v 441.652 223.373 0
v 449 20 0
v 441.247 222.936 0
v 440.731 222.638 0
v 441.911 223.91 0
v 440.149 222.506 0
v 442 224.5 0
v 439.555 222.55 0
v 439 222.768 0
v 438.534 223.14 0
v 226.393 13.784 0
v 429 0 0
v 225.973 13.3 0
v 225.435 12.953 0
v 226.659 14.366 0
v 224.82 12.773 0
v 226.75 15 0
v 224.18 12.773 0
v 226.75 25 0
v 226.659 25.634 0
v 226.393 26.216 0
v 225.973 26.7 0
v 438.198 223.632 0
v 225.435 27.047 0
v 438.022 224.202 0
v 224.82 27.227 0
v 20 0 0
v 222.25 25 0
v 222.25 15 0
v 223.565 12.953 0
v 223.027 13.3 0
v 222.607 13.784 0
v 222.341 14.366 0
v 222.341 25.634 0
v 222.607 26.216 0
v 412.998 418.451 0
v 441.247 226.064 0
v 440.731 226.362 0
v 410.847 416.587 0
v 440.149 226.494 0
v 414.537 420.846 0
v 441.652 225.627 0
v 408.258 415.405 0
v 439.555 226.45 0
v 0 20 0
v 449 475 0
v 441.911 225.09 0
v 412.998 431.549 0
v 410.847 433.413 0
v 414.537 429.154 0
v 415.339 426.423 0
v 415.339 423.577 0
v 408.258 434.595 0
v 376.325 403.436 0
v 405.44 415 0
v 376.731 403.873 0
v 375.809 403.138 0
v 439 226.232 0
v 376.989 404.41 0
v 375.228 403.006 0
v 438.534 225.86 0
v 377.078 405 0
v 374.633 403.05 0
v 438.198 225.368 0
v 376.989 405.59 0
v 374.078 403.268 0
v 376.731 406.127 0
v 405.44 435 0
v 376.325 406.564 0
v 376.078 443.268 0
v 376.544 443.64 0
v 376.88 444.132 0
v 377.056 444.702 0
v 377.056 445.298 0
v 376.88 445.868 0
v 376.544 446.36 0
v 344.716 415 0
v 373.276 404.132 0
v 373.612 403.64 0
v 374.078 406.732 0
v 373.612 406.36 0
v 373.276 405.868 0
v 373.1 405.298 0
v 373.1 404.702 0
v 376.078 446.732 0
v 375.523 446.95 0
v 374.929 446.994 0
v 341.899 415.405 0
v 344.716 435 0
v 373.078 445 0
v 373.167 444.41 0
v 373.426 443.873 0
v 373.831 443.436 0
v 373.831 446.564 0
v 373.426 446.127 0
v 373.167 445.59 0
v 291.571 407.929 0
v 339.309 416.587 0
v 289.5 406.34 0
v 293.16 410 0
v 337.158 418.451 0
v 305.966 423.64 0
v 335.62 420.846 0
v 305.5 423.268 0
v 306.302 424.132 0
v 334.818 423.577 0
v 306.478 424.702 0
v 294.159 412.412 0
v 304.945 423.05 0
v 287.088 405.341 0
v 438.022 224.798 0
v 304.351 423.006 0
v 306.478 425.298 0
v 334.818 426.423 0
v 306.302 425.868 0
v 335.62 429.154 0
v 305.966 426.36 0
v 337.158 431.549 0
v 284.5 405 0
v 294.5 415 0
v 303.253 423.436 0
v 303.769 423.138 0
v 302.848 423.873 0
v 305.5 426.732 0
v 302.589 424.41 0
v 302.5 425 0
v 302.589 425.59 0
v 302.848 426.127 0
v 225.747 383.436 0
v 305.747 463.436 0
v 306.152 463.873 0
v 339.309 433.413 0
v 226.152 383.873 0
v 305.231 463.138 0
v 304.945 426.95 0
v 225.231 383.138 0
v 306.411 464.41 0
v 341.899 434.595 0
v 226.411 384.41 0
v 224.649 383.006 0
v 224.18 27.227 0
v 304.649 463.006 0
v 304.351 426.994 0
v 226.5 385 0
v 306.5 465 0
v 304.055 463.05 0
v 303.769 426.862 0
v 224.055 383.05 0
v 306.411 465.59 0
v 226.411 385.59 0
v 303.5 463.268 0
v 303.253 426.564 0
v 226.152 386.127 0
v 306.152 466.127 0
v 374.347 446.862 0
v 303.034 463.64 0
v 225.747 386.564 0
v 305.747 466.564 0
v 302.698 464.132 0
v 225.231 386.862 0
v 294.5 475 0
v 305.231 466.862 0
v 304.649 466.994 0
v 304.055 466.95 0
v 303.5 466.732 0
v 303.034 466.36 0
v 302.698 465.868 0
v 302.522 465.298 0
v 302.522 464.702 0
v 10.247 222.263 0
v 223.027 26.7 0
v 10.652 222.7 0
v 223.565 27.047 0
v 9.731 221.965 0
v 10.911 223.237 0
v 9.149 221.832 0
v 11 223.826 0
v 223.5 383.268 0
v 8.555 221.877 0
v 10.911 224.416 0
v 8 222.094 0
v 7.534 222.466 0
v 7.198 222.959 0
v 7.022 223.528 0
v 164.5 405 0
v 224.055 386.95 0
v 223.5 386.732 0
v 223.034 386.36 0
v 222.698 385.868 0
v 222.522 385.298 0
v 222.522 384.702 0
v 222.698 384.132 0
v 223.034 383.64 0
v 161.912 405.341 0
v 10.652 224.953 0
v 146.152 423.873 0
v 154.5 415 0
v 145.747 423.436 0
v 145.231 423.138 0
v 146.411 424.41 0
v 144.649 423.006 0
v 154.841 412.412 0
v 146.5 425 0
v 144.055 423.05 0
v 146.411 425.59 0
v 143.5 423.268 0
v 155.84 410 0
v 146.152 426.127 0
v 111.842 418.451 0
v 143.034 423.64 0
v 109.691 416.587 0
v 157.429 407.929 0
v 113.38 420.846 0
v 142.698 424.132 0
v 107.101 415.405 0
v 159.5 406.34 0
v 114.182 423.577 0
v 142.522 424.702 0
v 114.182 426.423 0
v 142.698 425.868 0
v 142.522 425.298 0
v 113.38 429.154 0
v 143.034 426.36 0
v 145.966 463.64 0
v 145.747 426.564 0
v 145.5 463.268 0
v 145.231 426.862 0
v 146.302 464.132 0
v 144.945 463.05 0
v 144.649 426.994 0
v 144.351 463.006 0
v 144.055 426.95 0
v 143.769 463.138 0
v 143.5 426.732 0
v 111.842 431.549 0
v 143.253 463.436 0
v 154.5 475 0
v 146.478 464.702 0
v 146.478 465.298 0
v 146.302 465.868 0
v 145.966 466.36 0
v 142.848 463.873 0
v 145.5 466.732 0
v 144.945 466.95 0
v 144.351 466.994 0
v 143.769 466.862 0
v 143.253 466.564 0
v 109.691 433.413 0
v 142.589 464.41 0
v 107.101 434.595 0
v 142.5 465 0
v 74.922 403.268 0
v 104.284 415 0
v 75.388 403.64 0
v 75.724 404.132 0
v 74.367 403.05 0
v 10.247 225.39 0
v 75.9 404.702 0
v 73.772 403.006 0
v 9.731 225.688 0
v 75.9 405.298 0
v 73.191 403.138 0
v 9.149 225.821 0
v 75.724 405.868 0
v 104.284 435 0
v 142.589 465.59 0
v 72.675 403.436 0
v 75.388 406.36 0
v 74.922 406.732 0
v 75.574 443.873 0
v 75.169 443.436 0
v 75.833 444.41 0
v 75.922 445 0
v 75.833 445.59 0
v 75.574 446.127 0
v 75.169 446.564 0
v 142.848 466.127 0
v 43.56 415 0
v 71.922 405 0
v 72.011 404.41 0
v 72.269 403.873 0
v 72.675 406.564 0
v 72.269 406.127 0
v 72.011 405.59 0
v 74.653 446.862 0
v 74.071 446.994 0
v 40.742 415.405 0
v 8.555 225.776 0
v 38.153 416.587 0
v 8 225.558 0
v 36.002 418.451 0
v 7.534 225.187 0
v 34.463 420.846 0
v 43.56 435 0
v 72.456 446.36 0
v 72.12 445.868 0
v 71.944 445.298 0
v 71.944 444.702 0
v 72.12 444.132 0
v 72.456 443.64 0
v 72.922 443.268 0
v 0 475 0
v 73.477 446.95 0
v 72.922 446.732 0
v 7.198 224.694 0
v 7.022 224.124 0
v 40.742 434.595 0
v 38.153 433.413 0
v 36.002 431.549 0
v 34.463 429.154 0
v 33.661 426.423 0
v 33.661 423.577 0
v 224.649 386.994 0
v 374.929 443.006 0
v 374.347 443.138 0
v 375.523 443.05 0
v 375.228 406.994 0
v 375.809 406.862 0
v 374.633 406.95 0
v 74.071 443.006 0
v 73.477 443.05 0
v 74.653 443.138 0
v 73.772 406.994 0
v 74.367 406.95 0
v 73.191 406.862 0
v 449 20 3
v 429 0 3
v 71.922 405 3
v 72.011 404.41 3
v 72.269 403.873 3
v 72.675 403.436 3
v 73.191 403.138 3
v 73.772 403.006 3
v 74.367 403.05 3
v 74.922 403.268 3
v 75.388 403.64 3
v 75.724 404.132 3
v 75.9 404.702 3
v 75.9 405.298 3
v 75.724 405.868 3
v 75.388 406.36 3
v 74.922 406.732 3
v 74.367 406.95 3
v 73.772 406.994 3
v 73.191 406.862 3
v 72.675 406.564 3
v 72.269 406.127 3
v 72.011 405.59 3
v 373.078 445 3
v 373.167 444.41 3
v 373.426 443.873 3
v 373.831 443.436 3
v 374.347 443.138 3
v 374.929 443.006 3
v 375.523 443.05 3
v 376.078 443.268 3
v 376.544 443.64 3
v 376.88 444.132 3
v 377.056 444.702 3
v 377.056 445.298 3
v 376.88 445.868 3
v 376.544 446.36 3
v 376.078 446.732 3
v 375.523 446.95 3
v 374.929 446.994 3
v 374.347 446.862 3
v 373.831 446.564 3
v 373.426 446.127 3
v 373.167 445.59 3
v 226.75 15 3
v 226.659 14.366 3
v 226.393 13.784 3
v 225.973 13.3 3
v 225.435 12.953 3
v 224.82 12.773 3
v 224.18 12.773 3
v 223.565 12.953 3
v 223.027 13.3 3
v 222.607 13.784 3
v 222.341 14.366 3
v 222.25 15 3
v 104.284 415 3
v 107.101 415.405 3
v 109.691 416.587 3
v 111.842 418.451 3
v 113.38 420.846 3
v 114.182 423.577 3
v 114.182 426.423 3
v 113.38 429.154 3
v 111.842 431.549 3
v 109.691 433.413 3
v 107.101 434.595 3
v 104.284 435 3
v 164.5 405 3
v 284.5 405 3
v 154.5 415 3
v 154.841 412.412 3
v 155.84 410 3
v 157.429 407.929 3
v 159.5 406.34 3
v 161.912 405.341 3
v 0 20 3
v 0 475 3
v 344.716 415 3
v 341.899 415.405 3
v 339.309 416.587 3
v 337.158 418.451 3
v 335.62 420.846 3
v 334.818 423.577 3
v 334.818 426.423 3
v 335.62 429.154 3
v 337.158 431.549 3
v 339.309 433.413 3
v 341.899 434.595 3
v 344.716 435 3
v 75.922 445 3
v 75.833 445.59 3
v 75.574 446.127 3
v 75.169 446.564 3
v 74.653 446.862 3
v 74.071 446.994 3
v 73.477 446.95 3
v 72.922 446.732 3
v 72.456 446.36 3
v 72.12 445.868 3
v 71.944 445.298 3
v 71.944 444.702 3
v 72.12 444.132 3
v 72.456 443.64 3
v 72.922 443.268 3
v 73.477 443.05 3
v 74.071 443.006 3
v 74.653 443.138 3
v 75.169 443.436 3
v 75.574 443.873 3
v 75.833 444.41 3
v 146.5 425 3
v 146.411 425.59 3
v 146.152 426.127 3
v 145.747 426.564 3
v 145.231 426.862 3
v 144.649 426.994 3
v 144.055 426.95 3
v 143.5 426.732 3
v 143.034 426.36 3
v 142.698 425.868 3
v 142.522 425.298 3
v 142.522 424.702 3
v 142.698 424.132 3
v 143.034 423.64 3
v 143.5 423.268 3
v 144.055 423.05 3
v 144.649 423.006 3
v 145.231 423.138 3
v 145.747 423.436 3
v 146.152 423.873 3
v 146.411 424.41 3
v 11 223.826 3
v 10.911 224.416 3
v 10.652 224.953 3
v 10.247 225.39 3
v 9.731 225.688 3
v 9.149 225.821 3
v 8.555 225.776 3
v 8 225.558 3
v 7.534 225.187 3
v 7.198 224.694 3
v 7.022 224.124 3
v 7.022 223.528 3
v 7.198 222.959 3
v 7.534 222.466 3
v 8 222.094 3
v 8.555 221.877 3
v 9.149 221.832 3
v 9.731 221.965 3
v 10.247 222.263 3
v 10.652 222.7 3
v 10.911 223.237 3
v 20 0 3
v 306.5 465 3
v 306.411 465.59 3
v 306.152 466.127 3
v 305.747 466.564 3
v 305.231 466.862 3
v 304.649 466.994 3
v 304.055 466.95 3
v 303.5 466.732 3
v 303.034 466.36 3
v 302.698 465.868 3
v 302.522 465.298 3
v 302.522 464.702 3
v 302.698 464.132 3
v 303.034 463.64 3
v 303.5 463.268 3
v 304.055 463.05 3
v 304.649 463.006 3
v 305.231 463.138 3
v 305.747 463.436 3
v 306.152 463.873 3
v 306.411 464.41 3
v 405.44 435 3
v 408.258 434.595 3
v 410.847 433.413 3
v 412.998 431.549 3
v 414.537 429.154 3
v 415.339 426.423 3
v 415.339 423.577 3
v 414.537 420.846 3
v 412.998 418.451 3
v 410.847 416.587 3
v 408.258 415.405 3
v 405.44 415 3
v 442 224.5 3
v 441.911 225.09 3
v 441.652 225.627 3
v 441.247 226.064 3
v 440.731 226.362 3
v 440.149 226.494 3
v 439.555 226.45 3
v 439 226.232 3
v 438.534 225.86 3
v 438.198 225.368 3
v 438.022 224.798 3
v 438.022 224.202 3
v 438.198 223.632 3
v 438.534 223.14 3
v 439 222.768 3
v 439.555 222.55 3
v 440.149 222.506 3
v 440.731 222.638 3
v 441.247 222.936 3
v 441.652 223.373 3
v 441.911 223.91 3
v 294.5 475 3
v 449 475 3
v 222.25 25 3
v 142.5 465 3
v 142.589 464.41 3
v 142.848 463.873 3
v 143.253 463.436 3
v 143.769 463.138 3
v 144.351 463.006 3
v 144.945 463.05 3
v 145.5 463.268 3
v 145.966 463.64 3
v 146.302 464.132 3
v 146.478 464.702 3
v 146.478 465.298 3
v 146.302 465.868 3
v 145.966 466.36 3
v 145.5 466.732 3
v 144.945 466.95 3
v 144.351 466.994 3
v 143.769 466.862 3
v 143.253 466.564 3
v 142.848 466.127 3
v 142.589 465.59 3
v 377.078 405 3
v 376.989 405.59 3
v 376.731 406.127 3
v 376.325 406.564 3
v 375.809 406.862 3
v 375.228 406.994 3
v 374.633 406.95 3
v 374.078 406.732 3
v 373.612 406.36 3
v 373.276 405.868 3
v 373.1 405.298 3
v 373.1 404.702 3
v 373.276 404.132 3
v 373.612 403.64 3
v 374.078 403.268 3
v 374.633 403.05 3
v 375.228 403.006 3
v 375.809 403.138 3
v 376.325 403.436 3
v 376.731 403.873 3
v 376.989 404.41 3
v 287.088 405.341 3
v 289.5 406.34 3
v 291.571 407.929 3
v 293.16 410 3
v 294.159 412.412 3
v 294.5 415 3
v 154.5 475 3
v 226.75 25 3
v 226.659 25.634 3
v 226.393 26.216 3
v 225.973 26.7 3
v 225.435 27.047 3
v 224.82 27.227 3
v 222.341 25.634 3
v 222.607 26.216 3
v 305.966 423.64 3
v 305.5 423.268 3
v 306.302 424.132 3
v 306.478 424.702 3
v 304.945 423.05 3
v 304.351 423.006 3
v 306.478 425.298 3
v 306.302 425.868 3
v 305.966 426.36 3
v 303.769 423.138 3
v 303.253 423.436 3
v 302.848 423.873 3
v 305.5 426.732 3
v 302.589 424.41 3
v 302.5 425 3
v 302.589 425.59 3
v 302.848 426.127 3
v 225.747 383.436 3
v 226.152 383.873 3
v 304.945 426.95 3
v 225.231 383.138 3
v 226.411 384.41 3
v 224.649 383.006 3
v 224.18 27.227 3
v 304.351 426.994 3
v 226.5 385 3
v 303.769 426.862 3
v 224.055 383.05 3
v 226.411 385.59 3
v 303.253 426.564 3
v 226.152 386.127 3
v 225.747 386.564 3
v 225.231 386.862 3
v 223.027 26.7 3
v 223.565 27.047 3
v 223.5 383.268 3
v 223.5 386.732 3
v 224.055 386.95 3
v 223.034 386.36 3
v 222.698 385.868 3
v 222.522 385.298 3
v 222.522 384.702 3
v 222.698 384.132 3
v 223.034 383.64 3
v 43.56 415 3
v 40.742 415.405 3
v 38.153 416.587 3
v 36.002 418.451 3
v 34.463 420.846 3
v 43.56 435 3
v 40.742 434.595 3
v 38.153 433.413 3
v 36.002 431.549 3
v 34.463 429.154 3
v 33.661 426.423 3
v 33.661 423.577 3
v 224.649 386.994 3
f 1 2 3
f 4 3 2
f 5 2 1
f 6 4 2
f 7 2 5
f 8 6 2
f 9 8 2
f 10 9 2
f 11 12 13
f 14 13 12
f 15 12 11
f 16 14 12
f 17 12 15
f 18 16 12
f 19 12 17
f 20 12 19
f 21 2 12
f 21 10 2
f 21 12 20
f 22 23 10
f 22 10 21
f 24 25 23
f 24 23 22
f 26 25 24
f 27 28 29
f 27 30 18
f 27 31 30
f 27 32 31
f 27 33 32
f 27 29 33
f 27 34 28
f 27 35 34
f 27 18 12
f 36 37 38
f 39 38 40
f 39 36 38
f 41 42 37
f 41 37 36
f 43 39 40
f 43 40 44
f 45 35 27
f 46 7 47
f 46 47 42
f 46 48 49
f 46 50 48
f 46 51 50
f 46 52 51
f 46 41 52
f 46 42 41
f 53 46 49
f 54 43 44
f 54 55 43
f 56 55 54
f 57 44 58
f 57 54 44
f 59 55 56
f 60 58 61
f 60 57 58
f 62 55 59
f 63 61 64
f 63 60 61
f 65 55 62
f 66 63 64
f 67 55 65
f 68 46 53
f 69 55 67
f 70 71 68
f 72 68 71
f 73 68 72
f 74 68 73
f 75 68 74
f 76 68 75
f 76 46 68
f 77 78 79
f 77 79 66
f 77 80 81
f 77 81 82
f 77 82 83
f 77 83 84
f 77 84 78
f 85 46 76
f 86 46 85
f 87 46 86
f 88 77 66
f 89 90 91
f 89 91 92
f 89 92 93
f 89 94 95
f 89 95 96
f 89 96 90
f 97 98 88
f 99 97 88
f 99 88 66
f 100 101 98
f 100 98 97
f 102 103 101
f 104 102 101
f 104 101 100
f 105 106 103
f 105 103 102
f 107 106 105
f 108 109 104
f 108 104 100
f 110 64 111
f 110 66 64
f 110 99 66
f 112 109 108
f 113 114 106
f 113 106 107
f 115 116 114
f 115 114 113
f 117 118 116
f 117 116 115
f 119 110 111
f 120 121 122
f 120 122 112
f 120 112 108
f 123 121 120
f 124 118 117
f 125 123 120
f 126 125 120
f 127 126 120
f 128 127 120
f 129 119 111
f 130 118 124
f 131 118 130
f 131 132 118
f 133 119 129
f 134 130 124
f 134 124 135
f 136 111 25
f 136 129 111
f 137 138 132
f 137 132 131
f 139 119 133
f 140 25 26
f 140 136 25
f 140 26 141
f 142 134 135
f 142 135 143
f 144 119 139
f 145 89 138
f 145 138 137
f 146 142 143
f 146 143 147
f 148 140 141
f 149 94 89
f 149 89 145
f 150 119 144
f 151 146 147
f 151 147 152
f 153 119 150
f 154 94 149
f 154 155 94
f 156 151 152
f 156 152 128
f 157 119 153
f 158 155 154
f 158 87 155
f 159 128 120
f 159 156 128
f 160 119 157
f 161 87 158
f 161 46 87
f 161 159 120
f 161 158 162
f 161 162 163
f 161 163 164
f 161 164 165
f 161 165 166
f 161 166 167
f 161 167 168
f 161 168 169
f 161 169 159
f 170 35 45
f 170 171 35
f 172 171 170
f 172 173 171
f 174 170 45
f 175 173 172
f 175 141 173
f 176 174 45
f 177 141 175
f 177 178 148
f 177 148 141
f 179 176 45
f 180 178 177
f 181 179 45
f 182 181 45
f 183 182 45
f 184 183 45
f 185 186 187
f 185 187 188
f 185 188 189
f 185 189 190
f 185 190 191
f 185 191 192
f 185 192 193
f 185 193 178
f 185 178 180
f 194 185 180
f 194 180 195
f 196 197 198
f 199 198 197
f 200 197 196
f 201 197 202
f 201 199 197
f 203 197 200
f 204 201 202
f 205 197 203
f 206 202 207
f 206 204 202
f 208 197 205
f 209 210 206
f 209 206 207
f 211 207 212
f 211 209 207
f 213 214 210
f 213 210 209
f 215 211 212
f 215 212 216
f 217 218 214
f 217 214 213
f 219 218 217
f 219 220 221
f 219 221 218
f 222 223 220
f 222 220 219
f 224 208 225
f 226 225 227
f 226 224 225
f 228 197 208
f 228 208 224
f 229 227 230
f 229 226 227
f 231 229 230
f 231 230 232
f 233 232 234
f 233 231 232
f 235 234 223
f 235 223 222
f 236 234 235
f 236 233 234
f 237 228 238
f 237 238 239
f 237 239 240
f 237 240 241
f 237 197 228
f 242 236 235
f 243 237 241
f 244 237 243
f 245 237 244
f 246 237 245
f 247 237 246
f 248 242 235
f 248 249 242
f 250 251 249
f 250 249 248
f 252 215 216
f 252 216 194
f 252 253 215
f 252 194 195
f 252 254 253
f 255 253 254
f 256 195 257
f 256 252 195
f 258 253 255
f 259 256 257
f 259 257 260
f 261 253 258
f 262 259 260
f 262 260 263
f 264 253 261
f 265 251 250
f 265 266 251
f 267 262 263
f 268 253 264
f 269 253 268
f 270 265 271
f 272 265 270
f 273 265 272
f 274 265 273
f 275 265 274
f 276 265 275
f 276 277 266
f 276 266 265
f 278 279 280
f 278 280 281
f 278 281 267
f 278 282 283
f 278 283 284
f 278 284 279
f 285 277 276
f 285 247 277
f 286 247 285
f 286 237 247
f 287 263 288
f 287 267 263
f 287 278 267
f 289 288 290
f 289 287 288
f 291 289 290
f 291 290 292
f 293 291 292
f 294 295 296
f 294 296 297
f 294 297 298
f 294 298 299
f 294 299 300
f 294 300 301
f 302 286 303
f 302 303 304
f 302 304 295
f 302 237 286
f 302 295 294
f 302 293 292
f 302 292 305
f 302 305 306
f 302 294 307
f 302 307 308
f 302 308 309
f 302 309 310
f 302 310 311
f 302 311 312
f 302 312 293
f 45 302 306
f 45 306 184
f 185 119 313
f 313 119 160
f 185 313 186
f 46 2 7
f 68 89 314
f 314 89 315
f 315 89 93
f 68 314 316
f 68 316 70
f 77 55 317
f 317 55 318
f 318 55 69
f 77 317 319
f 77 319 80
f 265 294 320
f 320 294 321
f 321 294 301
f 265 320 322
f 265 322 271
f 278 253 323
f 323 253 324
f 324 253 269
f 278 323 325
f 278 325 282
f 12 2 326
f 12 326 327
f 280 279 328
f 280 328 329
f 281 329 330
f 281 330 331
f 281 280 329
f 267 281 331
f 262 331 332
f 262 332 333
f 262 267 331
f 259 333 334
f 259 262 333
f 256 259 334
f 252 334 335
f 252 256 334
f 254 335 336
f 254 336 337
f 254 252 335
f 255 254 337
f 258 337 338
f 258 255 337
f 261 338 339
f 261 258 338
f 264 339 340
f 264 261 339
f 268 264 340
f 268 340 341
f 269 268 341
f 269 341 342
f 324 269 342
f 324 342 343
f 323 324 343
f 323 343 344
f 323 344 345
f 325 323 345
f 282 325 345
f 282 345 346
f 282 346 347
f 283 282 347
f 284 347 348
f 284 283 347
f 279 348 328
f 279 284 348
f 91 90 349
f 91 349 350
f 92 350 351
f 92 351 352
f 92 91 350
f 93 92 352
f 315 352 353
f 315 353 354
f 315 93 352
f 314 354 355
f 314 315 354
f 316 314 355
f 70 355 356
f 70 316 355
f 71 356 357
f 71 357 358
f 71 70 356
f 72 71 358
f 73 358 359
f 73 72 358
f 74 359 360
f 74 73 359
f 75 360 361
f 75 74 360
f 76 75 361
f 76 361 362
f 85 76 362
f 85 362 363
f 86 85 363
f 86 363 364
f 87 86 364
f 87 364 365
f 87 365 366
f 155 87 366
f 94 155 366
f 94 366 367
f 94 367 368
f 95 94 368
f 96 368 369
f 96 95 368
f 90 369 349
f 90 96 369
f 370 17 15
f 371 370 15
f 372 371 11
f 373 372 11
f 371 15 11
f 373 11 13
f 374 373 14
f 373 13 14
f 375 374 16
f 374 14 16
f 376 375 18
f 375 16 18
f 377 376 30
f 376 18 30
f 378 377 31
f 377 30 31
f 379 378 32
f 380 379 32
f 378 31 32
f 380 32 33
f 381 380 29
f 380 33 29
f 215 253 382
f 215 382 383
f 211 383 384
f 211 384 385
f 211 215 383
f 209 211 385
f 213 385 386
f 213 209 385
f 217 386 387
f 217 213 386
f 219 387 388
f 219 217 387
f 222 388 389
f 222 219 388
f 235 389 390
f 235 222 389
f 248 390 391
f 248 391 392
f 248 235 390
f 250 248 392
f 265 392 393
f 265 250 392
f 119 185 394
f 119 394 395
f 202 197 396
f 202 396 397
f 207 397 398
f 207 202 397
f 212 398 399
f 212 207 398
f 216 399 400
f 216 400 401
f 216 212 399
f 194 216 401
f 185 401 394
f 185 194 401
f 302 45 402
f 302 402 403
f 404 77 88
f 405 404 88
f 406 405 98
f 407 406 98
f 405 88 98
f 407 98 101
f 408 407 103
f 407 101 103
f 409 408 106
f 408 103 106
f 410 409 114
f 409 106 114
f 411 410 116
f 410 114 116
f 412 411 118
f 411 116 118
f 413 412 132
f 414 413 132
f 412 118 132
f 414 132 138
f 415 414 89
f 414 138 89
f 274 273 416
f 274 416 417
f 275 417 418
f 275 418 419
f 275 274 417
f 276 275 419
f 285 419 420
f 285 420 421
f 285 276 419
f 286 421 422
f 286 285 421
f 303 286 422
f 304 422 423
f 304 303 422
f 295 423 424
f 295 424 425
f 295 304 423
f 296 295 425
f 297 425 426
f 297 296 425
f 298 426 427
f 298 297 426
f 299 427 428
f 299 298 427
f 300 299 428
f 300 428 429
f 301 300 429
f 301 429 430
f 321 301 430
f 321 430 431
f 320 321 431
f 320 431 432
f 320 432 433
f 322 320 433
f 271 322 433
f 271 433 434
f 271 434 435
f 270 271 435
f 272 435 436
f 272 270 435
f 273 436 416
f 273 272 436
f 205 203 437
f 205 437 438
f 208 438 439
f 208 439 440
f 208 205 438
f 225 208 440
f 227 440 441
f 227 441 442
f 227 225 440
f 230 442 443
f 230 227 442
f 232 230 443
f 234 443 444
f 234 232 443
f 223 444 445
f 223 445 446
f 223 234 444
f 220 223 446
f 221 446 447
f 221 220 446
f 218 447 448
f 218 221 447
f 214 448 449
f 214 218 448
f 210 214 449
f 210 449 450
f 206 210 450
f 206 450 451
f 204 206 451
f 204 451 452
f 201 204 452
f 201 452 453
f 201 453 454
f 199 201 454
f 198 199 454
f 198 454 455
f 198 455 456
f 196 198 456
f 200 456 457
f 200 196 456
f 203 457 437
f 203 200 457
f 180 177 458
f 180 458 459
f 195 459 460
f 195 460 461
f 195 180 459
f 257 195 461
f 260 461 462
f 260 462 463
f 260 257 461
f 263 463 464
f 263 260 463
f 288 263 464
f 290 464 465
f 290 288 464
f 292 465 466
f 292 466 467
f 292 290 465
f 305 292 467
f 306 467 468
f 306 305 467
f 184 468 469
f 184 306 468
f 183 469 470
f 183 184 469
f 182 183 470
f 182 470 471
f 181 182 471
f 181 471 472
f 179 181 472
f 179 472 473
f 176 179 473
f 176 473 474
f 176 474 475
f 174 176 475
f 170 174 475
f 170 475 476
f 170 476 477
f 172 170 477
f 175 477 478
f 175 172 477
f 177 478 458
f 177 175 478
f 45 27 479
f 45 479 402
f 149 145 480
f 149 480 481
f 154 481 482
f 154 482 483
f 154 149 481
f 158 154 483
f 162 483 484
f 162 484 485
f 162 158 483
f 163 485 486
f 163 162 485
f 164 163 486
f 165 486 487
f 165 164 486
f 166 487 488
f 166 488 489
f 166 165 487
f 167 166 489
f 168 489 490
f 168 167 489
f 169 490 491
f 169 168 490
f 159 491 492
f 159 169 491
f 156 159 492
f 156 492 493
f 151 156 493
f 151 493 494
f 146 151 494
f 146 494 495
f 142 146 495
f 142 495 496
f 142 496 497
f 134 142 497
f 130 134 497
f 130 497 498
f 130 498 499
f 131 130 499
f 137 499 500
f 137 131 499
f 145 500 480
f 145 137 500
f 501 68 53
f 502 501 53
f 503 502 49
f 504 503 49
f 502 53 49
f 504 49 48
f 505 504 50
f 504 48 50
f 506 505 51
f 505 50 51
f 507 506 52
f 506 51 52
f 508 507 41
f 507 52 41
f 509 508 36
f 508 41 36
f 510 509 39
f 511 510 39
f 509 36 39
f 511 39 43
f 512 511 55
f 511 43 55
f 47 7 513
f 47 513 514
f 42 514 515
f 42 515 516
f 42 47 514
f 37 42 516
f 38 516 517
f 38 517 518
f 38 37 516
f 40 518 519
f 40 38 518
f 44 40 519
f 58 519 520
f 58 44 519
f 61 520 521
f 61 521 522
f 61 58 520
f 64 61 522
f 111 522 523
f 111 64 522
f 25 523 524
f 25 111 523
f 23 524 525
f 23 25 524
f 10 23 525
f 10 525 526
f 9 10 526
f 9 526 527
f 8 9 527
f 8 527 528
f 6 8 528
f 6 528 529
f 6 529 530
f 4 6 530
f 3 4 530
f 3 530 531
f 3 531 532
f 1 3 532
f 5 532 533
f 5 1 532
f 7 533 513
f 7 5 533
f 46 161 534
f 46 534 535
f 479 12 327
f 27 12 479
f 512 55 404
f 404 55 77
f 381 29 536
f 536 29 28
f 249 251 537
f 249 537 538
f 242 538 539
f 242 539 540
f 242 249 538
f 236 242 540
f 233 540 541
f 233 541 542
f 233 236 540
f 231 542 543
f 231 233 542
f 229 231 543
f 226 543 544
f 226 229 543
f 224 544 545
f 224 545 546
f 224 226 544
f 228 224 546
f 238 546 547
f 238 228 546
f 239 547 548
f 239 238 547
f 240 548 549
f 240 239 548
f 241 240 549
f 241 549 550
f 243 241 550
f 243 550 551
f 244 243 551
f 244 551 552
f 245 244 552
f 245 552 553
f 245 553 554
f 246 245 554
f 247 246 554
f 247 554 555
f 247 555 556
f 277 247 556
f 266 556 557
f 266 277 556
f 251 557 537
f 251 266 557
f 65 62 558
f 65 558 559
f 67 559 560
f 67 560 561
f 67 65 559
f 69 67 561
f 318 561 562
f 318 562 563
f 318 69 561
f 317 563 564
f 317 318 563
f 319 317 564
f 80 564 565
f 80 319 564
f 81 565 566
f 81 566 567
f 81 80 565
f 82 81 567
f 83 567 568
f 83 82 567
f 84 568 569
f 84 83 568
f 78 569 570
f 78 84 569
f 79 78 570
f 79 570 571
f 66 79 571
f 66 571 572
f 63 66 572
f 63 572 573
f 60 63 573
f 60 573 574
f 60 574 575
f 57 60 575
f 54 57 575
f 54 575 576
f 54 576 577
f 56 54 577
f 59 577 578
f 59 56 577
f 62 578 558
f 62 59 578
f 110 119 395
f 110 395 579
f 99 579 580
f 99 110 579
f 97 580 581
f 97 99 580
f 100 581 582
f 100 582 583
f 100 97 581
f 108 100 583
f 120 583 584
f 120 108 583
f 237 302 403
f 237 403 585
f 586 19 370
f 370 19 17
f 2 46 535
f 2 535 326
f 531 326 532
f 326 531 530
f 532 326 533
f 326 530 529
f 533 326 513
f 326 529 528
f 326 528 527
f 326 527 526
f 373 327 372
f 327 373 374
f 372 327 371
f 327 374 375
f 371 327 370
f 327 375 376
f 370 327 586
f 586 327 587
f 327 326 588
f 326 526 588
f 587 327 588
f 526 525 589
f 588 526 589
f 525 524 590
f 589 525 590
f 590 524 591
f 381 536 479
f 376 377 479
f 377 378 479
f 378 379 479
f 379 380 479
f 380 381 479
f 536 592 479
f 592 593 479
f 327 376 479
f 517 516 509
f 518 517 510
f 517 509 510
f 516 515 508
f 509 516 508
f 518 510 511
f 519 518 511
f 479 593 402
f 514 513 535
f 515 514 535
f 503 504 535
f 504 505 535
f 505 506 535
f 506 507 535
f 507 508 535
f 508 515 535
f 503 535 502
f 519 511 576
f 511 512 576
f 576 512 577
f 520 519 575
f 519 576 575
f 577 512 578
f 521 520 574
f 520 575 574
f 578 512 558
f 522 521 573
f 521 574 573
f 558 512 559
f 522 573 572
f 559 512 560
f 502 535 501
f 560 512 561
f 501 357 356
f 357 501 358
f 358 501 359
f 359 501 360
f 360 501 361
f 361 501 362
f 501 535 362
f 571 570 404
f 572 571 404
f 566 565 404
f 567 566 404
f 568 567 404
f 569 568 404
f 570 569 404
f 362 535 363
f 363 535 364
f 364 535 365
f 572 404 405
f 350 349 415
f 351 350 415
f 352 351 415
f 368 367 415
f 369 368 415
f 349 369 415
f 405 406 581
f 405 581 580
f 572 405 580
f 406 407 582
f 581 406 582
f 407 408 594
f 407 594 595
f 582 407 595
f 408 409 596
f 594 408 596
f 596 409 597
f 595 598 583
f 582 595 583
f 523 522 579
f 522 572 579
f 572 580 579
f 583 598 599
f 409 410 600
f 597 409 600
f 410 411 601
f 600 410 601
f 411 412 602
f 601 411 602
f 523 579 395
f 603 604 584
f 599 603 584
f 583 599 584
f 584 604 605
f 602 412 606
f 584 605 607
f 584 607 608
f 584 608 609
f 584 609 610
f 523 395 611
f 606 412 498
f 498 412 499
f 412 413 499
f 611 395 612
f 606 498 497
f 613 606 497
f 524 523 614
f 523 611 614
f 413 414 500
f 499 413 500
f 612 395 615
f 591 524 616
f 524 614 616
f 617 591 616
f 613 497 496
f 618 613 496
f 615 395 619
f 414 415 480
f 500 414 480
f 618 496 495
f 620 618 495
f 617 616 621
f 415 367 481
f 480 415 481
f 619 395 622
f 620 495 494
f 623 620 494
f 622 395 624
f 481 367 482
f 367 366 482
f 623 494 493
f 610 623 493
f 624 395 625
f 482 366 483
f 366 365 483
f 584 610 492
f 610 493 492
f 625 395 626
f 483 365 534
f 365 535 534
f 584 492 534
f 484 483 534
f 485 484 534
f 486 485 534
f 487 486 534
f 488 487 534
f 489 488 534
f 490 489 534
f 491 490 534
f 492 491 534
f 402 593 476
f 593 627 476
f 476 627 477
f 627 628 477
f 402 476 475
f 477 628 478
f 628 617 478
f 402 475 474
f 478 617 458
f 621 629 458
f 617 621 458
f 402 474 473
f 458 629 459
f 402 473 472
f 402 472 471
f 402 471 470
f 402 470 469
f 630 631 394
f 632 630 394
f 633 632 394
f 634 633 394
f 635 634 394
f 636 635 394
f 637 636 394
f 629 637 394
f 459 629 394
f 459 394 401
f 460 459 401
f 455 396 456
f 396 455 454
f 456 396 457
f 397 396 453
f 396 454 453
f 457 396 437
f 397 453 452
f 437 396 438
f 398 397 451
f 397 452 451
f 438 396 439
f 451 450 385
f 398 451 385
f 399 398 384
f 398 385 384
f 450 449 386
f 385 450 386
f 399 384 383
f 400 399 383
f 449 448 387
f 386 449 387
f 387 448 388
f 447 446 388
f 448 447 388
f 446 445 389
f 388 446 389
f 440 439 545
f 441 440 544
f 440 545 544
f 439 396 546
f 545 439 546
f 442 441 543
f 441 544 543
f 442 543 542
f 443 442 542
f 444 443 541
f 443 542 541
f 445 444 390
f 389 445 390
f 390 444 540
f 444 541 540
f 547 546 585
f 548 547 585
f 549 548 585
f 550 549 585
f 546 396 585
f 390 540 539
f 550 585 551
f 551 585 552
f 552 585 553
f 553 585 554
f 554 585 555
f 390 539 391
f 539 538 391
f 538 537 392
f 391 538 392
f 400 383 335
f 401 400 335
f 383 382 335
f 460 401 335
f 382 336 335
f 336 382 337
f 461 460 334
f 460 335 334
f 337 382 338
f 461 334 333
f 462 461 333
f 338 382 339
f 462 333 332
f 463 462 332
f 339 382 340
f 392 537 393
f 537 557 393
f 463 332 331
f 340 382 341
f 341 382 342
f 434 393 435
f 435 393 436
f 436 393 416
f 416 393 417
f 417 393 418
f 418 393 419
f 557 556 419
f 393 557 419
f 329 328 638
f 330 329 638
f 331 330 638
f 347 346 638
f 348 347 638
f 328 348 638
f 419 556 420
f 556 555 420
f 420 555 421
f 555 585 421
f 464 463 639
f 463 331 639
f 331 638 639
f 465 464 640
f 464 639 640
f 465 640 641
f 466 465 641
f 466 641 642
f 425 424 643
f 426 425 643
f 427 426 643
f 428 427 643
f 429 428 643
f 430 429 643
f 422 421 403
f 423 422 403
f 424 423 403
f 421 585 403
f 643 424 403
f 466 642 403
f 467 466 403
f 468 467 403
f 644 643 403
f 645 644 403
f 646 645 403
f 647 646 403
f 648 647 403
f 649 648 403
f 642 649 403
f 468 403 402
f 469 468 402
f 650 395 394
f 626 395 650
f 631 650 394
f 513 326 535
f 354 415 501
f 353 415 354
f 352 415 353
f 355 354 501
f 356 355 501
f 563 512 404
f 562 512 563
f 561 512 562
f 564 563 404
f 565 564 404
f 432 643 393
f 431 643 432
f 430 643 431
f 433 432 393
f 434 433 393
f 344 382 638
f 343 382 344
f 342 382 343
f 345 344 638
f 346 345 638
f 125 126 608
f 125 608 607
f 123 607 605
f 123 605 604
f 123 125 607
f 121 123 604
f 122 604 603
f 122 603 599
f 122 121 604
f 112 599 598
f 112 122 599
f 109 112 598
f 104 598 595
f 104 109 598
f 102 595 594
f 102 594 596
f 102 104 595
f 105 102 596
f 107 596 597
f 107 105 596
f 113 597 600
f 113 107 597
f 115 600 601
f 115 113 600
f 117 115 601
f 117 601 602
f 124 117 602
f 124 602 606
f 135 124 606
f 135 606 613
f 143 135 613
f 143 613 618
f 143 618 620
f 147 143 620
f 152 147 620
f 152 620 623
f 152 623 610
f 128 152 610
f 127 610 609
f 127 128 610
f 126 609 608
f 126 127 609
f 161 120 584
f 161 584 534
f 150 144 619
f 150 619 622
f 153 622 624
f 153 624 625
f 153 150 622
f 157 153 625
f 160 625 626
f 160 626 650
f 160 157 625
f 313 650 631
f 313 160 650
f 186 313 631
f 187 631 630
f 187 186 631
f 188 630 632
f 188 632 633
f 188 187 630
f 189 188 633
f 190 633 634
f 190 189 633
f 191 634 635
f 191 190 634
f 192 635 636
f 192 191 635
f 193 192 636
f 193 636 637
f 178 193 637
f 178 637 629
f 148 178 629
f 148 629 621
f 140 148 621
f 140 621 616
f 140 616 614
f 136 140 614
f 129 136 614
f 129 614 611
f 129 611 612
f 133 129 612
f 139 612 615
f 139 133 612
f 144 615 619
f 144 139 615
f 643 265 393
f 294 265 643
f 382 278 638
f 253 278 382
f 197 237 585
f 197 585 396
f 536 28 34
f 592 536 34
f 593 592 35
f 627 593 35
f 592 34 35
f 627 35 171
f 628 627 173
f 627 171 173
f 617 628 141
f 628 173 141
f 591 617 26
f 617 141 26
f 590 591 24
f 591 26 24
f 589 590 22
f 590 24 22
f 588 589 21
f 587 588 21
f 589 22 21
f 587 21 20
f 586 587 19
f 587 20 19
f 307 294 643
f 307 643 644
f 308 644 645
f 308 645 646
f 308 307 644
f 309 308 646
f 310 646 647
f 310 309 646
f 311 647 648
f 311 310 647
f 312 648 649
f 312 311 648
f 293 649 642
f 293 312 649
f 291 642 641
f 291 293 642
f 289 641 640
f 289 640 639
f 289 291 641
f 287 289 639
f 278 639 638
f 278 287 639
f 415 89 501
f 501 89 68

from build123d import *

# Parameters (mm, degrees)
SCHIZZO1_R                   = 2
ESTRUSIONE_ESTRUSIONE1_DEPTH = 3


with BuildPart() as part:
    # Schizzo1 → Estrusione-Estrusione1 (new body)
    with BuildSketch(Plane.XY):
        with BuildLine():
            Line((0, 20), (0, 475))
            Line((0, 475), (154.5, 475))
            Line((154.5, 475), (154.5, 415))
            ThreePointArc((154.5, 415), (157.428932188, 407.928932188), (164.5, 405))
            Line((164.5, 405), (284.5, 405))
            ThreePointArc((284.5, 405), (291.571067812, 407.928932188), (294.5, 415))
            Line((294.5, 415), (294.5, 475))
            Line((294.5, 475), (449, 475))
            Line((449, 475), (449, 20))
            Line((449, 20), (429, 0))
            Line((429, 0), (20, 0))
            Line((20, 0), (0, 20))
        make_face()
        with Locations((144.5, 425)):
            Circle(SCHIZZO1_R, mode=Mode.SUBTRACT)
        with Locations((224.5, 385)):
            Circle(SCHIZZO1_R, mode=Mode.SUBTRACT)
        with Locations((73.921872489, 445)):
            Circle(SCHIZZO1_R, mode=Mode.SUBTRACT)
        with Locations((9, 223.826386399)):
            Circle(SCHIZZO1_R, mode=Mode.SUBTRACT)
        with Locations((440, 224.5)):
            Circle(SCHIZZO1_R, mode=Mode.SUBTRACT)
        with Locations(Location((73.921872489, 405, 0), (0, 0, 180))):
            Circle(SCHIZZO1_R, mode=Mode.SUBTRACT)
        with Locations((375.078127511, 405)):
            Circle(SCHIZZO1_R, mode=Mode.SUBTRACT)
        with Locations(Location((375.078127511, 445, 0), (0, 0, 180))):
            Circle(SCHIZZO1_R, mode=Mode.SUBTRACT)
        with Locations(Location((144.5, 465, 0), (0, 0, 180))):
            Circle(SCHIZZO1_R, mode=Mode.SUBTRACT)
        with Locations(Location((304.5, 425, 0), (0, 0, 180))):
            Circle(SCHIZZO1_R, mode=Mode.SUBTRACT)
        with Locations((304.5, 465)):
            Circle(SCHIZZO1_R, mode=Mode.SUBTRACT)
        with BuildLine():
            Line((344.715899345, 435), (405.440355678, 435))
            ThreePointArc((405.440355678, 435), (415.440355678, 425), (405.440355678, 415))
            Line((405.440355678, 415), (344.715899345, 415))
            ThreePointArc((344.715899345, 415), (334.715899345, 425), (344.715899345, 435))
        make_face(mode=Mode.SUBTRACT)
        with BuildLine():
            Line((104.284100655, 435), (43.559644322, 435))
            ThreePointArc((43.559644322, 435), (33.559644322, 425), (43.559644322, 415))
            Line((43.559644322, 415), (104.284100655, 415))
            ThreePointArc((104.284100655, 415), (114.284100655, 425), (104.284100655, 435))
        make_face(mode=Mode.SUBTRACT)
        with BuildLine():
            Line((222.25, 15), (222.25, 25))
            ThreePointArc((222.25, 25), (224.5, 27.25), (226.75, 25))
            Line((226.75, 25), (226.75, 15))
            ThreePointArc((226.75, 15), (224.5, 12.75), (222.25, 15))
        make_face(mode=Mode.SUBTRACT)
    extrude(amount=ESTRUSIONE_ESTRUSIONE1_DEPTH)


solid = part.part
